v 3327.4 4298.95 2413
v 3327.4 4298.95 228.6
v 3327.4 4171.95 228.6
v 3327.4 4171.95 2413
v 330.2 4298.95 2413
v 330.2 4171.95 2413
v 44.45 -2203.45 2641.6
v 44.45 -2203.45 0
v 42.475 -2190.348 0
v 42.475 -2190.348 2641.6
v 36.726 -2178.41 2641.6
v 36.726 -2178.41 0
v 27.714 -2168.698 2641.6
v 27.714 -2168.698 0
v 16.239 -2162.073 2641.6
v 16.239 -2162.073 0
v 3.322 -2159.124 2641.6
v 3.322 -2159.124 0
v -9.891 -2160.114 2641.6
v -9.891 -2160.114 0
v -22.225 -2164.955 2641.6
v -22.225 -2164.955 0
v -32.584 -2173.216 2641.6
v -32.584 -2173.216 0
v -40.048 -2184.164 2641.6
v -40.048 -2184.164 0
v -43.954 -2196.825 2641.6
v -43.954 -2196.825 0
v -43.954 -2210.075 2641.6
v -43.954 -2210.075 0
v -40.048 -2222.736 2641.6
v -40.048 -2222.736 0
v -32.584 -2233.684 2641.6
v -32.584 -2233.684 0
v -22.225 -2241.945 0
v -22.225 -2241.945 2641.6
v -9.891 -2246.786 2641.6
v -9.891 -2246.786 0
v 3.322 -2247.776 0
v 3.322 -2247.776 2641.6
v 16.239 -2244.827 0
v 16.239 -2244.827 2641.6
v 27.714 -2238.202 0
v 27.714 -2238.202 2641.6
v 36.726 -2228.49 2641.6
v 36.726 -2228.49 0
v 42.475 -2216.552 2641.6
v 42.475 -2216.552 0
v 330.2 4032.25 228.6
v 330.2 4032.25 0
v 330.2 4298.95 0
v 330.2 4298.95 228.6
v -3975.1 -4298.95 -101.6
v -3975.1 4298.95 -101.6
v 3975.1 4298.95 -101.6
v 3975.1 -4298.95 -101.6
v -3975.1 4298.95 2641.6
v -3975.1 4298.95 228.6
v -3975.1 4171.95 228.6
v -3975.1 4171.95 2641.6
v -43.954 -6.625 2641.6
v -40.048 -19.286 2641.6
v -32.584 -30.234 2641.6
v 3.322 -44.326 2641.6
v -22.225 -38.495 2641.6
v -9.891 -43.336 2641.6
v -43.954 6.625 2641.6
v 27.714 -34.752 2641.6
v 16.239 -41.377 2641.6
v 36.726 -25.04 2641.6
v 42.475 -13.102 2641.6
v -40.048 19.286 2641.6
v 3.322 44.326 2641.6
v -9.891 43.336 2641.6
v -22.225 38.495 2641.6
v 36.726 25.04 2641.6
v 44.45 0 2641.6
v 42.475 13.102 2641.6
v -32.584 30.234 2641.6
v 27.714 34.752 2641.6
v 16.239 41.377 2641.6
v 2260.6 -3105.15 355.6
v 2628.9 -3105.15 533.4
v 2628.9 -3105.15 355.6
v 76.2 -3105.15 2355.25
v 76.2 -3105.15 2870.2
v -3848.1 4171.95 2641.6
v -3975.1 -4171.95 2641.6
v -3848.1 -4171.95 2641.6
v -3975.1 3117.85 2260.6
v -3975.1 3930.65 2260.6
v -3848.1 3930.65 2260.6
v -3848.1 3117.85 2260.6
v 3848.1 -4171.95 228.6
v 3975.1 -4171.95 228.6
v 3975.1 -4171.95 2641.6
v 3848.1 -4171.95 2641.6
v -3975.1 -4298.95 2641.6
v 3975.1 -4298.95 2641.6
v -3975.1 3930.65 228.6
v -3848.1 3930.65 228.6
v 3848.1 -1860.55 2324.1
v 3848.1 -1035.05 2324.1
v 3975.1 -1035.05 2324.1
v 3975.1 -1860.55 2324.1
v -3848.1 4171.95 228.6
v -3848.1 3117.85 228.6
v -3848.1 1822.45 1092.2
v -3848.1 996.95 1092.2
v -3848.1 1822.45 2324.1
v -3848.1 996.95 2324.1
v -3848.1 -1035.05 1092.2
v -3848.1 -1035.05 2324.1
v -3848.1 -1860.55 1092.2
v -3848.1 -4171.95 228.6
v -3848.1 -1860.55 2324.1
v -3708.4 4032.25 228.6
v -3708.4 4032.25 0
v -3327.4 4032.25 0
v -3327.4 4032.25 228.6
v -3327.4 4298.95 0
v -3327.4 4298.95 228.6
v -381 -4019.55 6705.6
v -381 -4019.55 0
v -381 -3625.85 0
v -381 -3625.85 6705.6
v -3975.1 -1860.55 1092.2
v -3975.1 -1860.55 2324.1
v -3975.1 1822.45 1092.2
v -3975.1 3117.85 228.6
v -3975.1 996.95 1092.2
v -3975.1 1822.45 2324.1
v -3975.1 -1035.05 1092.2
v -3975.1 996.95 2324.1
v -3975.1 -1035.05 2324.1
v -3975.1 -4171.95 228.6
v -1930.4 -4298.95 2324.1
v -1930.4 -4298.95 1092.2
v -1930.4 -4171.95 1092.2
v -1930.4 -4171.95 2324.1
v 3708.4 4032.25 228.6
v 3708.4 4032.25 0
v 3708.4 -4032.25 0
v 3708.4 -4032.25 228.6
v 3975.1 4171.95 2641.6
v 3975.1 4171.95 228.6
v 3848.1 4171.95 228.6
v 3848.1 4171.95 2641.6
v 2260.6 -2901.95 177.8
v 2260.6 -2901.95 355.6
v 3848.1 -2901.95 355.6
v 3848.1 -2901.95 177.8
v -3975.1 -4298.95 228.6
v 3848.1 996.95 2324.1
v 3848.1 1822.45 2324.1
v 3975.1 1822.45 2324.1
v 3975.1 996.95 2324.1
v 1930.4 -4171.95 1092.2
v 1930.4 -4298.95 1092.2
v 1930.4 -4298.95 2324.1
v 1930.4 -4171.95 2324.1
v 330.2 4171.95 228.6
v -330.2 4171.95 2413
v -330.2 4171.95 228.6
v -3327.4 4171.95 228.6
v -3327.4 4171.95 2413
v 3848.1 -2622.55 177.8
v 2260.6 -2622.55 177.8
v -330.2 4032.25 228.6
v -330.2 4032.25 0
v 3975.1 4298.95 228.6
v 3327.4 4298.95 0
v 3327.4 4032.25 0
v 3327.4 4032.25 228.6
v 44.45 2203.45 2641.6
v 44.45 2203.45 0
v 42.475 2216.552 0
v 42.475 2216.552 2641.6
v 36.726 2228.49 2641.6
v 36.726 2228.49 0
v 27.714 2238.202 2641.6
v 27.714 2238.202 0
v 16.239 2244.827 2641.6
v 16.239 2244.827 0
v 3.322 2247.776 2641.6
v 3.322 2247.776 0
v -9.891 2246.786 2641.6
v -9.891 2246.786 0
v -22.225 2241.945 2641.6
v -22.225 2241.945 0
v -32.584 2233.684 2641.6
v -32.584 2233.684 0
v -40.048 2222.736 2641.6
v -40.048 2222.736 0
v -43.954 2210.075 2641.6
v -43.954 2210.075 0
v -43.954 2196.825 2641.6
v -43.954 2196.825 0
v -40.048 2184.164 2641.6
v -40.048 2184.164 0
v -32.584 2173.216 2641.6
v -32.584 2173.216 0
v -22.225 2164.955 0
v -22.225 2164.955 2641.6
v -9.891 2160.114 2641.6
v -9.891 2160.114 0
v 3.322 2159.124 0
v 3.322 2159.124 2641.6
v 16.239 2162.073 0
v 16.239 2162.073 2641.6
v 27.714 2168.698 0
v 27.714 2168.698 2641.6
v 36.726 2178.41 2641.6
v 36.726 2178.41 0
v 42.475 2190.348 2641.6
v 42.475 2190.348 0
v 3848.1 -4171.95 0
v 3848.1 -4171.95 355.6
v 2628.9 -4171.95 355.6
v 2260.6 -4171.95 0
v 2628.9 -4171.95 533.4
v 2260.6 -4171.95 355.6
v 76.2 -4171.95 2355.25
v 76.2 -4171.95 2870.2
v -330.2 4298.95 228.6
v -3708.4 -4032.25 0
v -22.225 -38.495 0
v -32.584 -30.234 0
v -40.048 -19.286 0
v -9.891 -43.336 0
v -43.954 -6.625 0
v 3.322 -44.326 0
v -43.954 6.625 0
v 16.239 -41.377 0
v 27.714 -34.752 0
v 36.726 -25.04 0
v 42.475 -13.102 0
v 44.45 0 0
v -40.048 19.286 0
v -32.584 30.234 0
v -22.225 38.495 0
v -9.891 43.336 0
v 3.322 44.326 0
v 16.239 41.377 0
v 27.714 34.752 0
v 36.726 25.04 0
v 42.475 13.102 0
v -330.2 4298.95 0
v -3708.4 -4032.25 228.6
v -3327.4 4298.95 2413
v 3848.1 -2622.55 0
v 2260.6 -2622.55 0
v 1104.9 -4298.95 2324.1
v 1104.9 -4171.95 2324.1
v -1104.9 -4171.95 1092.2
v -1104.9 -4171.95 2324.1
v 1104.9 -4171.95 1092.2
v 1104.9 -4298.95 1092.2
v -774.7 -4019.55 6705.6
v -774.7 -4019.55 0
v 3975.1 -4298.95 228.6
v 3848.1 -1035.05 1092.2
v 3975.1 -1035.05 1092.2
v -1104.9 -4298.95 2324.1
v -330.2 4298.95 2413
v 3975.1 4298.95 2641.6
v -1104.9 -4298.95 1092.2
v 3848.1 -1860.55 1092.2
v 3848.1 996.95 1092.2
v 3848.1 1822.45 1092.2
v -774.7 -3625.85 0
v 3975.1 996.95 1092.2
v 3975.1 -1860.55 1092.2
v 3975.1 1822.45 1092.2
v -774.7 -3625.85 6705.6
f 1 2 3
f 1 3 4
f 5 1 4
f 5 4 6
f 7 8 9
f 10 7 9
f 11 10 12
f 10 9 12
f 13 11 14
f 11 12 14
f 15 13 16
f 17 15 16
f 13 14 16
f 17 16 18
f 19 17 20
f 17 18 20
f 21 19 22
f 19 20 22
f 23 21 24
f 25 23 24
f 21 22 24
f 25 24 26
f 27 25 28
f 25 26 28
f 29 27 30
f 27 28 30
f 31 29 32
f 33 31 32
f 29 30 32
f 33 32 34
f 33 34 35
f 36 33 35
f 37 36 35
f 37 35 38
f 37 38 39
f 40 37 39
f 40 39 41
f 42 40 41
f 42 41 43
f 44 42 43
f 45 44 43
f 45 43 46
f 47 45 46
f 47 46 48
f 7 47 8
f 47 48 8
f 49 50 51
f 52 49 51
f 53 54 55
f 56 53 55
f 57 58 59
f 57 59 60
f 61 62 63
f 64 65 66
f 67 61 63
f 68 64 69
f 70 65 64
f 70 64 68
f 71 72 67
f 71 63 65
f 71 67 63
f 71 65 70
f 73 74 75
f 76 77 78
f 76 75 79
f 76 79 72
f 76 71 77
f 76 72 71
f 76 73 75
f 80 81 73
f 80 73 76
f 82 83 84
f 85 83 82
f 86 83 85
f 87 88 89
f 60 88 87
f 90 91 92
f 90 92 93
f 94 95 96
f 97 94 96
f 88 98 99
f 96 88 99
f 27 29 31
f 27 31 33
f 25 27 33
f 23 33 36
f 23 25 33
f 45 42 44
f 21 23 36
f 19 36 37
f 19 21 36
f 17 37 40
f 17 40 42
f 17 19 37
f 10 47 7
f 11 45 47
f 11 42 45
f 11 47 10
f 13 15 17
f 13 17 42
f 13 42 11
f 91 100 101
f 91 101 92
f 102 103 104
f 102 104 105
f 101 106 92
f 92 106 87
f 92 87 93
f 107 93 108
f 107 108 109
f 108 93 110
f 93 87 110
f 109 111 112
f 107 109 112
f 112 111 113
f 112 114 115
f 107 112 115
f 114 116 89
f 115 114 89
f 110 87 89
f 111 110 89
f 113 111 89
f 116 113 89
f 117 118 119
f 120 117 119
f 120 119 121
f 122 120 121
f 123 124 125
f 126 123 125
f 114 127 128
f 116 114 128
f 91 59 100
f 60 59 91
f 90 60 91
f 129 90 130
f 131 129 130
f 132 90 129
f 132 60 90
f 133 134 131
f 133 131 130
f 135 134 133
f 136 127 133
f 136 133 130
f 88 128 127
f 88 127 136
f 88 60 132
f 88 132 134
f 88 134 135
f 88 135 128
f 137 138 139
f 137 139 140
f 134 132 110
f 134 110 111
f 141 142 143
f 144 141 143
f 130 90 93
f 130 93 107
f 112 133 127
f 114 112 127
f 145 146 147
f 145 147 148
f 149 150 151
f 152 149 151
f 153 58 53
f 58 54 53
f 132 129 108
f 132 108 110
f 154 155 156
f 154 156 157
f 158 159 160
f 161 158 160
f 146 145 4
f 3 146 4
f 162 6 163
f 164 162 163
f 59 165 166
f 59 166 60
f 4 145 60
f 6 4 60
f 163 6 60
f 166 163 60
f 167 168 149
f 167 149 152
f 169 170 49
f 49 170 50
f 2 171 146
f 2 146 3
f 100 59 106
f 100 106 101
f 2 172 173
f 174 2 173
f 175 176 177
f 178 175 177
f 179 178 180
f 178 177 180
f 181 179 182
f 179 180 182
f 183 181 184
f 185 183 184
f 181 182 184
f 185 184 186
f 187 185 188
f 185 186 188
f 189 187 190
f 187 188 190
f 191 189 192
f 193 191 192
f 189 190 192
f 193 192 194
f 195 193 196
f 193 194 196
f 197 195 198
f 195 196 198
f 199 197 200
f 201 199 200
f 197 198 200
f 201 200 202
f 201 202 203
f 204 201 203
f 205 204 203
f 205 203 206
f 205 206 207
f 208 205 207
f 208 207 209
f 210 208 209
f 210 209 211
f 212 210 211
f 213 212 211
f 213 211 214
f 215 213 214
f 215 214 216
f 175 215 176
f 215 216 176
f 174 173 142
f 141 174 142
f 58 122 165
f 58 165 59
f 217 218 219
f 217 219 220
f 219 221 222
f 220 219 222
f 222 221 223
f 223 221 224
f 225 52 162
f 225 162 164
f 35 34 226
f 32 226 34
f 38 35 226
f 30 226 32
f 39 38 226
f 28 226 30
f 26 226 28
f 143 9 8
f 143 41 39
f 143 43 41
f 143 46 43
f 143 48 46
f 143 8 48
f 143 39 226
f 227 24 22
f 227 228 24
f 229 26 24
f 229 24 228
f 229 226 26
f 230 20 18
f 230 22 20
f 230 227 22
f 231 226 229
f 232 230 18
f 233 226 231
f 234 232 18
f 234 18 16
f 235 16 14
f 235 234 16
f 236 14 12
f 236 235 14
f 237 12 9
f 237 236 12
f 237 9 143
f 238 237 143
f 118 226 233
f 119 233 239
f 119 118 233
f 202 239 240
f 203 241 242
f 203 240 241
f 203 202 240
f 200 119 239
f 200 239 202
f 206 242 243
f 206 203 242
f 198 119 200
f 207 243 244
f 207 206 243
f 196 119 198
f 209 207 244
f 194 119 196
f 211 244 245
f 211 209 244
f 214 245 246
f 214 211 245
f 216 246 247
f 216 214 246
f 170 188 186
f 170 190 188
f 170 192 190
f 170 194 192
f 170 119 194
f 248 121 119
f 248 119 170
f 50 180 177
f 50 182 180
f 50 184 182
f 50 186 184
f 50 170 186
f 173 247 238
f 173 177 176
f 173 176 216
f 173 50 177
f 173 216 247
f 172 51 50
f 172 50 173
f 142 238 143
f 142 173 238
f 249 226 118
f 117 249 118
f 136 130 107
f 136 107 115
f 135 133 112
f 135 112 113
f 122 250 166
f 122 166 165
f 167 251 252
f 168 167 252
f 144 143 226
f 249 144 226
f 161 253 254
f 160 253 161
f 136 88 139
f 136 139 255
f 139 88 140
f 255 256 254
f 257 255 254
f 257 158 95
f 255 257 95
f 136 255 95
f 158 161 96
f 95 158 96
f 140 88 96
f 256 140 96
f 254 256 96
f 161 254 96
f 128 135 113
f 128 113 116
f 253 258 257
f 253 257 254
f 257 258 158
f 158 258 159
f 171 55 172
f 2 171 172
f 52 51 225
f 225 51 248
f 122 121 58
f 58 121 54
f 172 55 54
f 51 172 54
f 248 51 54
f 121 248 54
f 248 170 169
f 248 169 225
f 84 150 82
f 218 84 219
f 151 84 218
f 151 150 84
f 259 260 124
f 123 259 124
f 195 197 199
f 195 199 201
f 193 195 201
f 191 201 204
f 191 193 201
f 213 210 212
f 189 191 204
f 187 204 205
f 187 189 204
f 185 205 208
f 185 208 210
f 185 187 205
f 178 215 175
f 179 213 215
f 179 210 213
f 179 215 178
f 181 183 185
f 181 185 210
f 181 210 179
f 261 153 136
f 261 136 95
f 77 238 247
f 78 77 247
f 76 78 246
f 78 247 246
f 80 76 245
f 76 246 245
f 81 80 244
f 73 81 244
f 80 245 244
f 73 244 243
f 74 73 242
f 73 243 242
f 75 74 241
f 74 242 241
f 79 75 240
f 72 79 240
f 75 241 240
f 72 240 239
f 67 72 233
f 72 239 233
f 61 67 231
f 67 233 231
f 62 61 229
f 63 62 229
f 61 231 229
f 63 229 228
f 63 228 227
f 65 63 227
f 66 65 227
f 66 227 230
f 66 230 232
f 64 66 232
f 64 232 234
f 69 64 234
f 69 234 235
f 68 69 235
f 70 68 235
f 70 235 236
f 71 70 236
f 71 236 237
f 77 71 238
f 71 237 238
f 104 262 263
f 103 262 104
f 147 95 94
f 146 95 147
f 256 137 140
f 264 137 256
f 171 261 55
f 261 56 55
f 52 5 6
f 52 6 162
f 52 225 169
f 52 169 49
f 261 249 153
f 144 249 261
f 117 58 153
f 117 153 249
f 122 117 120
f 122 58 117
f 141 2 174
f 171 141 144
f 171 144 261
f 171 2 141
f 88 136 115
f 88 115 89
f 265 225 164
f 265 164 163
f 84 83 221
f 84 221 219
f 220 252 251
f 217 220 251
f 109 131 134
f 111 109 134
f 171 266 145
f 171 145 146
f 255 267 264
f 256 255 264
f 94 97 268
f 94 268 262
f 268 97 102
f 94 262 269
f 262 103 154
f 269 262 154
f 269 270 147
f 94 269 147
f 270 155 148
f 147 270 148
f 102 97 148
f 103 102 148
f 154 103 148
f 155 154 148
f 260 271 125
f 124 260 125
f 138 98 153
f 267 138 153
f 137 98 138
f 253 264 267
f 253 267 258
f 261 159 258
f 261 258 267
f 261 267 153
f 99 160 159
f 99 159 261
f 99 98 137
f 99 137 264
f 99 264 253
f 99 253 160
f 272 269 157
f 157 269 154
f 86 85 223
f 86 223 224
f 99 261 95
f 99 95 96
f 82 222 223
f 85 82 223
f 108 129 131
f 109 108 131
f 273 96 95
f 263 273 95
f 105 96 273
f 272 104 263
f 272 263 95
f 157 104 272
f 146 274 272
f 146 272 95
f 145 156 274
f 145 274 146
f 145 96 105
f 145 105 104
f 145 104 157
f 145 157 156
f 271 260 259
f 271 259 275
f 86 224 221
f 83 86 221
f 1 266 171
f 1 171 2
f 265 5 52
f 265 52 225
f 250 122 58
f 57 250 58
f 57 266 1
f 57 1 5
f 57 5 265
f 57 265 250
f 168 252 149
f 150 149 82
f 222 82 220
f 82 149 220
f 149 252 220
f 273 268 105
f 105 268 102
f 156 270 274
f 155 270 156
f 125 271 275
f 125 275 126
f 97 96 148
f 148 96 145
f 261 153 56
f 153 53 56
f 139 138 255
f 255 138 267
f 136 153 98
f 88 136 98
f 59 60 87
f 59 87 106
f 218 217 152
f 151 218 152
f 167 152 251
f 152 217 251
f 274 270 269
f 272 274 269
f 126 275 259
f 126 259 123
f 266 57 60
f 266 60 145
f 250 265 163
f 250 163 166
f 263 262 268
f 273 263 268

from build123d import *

# Parameters (mm, degrees)
F0_W      = 7950.2
F0_H      = 8597.9
F1_DEPTH  = 101.6
F2_W      = 660.4
F2_H      = 266.7
F3_DEPTH  = 228.6
F5_DEPTH  = 127
F6_W      = 7950.2
F6_H      = 2413
F6_W_2    = 825.5
F6_H_2    = 1231.9
F7_DEPTH  = 127
F8_W      = 825.5
F8_H      = 1231.9
F9_DEPTH  = 127
F10_W     = 8343.9
F10_H     = 2413
F11_DEPTH = 127
F12_DEPTH = 7950.2
F13_W     = 393.7
F13_H     = 393.7
F14_DEPTH = 6705.6
F15_W     = 1447.8
F15_H     = 1409.7
F16_DEPTH = 355.6
F17_W     = 1587.5
F17_H     = 279.4
F18_DEPTH = 177.8
F20_DEPTH = 1066.8
F21_R     = 44.45
F22_DEPTH = 2641.6


# Not quite as in the source:
# - a feature names something its author has since deleted; it is built from what else it names


with BuildPart() as f1:
    # F0 (on Top) → F1 (new body)
    with BuildSketch(Plane.XY):
        Rectangle(F0_W, F0_H)
    extrude(amount=-F1_DEPTH)

    # F2 (on face) → F3 (join)
    with BuildSketch(Plane.XY):
        Polygon((-3327.4, 4032.25), (-3327.4, 4298.95), (-3975.1, 4298.95), (-3975.1, -4298.95), (3975.1, -4298.95), (3975.1, 4298.95), (3327.4, 4298.95), (3327.4, 4032.25), (3708.4, 4032.25), (3708.4, -4032.25), (-3708.4, -4032.25), (-3708.4, 4032.25), align=None)
        with Locations((0, 4165.6)):
            Rectangle(F2_W, F2_H)
    extrude(amount=F3_DEPTH)

    # F21 (on face) → F22 (join, through all)
    with BuildSketch(Plane.XY):
        with Locations((0, 2203.45)):
            Circle(F21_R)
        Circle(F21_R)
        with Locations((0, -2203.45)):
            Circle(F21_R)
    extrude(amount=F22_DEPTH)


with BuildPart() as f5:
    # F4 (on face) → F5 (new body)
    with BuildSketch(Plane(origin=(0, 4298.95, 0), x_dir=(-1, 0, 0), z_dir=(0, 1, 0))):
        Polygon((-3975.1, 2641.6), (-3975.1, 228.6), (-3327.4, 228.6), (-3327.4, 2413), (-330.2, 2413), (-330.2, 228.6), (330.2, 228.6), (330.2, 2413), (3327.4, 2413), (3327.4, 228.6), (3975.1, 228.6), (3975.1, 2641.6), align=None)
    extrude(amount=-F5_DEPTH)


with BuildPart() as f7:
    # F6 (on face) → F7 (new body)
    with BuildSketch(Plane.XZ.offset(4298.95)):
        with Locations((0, 1435.1)):
            Rectangle(F6_W, F6_H)
        with Locations((-1517.65, 1708.15)):
            Rectangle(F6_W_2, F6_H_2, mode=Mode.SUBTRACT)
        with Locations((1517.65, 1708.15)):
            Rectangle(F6_W_2, F6_H_2, mode=Mode.SUBTRACT)
    extrude(amount=-F7_DEPTH)


with BuildPart() as f9:
    # F8 (on face) → F9 (new body)
    with BuildSketch(Plane(origin=(-3975.1, 0, 0), x_dir=(0, -1, 0), z_dir=(-1, 0, 0))):
        Polygon((4171.95, 2641.6), (-4171.95, 2641.6), (-4171.95, 228.6), (-3930.65, 228.6), (-3930.65, 2260.6), (-3117.85, 2260.6), (-3117.85, 228.6), (4171.95, 228.6), align=None)
        with Locations((-1409.7, 1708.15)):
            Rectangle(F8_W, F8_H, mode=Mode.SUBTRACT)
        with Locations((1447.8, 1708.15)):
            Rectangle(F8_W, F8_H, mode=Mode.SUBTRACT)
    extrude(amount=-F9_DEPTH)


with BuildPart() as f11:
    # F10 (on face) → F11 (new body)
    with BuildSketch(Plane.YZ.offset(3975.1)):
        with Locations((0, 1435.1)):
            Rectangle(F10_W, F10_H)
    extrude(amount=-F11_DEPTH)

    # F8 (on face) → F12 (cut, through all)
    with BuildSketch(Plane(origin=(-3975.1, 0, 0), x_dir=(0, -1, 0), z_dir=(-1, 0, 0))):
        with Locations((-1409.7, 1708.15)):
            Rectangle(F8_W, F8_H)
        with Locations((1447.8, 1708.15)):
            Rectangle(F8_W, F8_H)
    extrude(amount=-F12_DEPTH, mode=Mode.SUBTRACT)


with BuildPart() as f14:
    # F13 (on face) → F14 (new body)
    with BuildSketch(Plane.XY):
        with Locations((-577.85, -3822.7)):
            Rectangle(F13_W, F13_H)
    extrude(amount=F14_DEPTH)


with BuildPart() as f16:
    # F15 (on face) → F16 (new body)
    with BuildSketch(Plane.XY):
        with Locations((2984.5, -3327.4)):
            Rectangle(F15_W, F15_H)
        Polygon((2260.6, -4171.95), (3848.1, -4171.95), (3848.1, -2622.55), (3708.4, -2622.55), (3708.4, -4032.25), (2260.6, -4032.25), align=None)
    extrude(amount=F16_DEPTH)

    # F17 (on face) → F18 (cut)
    with BuildSketch(Plane.XY.offset(355.6)):
        with Locations((3054.35, -2762.25)):
            Rectangle(F17_W, F17_H)
    extrude(amount=-F18_DEPTH, mode=Mode.SUBTRACT)

    # F19 (on face) → F20 (join)
    with BuildSketch(Plane(origin=(0, -4171.95, 0), x_dir=(-1, 0, 0), z_dir=(0, 1, 0))):
        Polygon((-2628.9, 355.6), (-2260.6, 355.6), (-76.2, 2355.2497512438), (-76.2, 2870.2), (-2628.9, 533.4), align=None)
    extrude(amount=F20_DEPTH)


solid = Compound([f1.part, f5.part, f7.part, f9.part, f11.part, f14.part, f16.part])
